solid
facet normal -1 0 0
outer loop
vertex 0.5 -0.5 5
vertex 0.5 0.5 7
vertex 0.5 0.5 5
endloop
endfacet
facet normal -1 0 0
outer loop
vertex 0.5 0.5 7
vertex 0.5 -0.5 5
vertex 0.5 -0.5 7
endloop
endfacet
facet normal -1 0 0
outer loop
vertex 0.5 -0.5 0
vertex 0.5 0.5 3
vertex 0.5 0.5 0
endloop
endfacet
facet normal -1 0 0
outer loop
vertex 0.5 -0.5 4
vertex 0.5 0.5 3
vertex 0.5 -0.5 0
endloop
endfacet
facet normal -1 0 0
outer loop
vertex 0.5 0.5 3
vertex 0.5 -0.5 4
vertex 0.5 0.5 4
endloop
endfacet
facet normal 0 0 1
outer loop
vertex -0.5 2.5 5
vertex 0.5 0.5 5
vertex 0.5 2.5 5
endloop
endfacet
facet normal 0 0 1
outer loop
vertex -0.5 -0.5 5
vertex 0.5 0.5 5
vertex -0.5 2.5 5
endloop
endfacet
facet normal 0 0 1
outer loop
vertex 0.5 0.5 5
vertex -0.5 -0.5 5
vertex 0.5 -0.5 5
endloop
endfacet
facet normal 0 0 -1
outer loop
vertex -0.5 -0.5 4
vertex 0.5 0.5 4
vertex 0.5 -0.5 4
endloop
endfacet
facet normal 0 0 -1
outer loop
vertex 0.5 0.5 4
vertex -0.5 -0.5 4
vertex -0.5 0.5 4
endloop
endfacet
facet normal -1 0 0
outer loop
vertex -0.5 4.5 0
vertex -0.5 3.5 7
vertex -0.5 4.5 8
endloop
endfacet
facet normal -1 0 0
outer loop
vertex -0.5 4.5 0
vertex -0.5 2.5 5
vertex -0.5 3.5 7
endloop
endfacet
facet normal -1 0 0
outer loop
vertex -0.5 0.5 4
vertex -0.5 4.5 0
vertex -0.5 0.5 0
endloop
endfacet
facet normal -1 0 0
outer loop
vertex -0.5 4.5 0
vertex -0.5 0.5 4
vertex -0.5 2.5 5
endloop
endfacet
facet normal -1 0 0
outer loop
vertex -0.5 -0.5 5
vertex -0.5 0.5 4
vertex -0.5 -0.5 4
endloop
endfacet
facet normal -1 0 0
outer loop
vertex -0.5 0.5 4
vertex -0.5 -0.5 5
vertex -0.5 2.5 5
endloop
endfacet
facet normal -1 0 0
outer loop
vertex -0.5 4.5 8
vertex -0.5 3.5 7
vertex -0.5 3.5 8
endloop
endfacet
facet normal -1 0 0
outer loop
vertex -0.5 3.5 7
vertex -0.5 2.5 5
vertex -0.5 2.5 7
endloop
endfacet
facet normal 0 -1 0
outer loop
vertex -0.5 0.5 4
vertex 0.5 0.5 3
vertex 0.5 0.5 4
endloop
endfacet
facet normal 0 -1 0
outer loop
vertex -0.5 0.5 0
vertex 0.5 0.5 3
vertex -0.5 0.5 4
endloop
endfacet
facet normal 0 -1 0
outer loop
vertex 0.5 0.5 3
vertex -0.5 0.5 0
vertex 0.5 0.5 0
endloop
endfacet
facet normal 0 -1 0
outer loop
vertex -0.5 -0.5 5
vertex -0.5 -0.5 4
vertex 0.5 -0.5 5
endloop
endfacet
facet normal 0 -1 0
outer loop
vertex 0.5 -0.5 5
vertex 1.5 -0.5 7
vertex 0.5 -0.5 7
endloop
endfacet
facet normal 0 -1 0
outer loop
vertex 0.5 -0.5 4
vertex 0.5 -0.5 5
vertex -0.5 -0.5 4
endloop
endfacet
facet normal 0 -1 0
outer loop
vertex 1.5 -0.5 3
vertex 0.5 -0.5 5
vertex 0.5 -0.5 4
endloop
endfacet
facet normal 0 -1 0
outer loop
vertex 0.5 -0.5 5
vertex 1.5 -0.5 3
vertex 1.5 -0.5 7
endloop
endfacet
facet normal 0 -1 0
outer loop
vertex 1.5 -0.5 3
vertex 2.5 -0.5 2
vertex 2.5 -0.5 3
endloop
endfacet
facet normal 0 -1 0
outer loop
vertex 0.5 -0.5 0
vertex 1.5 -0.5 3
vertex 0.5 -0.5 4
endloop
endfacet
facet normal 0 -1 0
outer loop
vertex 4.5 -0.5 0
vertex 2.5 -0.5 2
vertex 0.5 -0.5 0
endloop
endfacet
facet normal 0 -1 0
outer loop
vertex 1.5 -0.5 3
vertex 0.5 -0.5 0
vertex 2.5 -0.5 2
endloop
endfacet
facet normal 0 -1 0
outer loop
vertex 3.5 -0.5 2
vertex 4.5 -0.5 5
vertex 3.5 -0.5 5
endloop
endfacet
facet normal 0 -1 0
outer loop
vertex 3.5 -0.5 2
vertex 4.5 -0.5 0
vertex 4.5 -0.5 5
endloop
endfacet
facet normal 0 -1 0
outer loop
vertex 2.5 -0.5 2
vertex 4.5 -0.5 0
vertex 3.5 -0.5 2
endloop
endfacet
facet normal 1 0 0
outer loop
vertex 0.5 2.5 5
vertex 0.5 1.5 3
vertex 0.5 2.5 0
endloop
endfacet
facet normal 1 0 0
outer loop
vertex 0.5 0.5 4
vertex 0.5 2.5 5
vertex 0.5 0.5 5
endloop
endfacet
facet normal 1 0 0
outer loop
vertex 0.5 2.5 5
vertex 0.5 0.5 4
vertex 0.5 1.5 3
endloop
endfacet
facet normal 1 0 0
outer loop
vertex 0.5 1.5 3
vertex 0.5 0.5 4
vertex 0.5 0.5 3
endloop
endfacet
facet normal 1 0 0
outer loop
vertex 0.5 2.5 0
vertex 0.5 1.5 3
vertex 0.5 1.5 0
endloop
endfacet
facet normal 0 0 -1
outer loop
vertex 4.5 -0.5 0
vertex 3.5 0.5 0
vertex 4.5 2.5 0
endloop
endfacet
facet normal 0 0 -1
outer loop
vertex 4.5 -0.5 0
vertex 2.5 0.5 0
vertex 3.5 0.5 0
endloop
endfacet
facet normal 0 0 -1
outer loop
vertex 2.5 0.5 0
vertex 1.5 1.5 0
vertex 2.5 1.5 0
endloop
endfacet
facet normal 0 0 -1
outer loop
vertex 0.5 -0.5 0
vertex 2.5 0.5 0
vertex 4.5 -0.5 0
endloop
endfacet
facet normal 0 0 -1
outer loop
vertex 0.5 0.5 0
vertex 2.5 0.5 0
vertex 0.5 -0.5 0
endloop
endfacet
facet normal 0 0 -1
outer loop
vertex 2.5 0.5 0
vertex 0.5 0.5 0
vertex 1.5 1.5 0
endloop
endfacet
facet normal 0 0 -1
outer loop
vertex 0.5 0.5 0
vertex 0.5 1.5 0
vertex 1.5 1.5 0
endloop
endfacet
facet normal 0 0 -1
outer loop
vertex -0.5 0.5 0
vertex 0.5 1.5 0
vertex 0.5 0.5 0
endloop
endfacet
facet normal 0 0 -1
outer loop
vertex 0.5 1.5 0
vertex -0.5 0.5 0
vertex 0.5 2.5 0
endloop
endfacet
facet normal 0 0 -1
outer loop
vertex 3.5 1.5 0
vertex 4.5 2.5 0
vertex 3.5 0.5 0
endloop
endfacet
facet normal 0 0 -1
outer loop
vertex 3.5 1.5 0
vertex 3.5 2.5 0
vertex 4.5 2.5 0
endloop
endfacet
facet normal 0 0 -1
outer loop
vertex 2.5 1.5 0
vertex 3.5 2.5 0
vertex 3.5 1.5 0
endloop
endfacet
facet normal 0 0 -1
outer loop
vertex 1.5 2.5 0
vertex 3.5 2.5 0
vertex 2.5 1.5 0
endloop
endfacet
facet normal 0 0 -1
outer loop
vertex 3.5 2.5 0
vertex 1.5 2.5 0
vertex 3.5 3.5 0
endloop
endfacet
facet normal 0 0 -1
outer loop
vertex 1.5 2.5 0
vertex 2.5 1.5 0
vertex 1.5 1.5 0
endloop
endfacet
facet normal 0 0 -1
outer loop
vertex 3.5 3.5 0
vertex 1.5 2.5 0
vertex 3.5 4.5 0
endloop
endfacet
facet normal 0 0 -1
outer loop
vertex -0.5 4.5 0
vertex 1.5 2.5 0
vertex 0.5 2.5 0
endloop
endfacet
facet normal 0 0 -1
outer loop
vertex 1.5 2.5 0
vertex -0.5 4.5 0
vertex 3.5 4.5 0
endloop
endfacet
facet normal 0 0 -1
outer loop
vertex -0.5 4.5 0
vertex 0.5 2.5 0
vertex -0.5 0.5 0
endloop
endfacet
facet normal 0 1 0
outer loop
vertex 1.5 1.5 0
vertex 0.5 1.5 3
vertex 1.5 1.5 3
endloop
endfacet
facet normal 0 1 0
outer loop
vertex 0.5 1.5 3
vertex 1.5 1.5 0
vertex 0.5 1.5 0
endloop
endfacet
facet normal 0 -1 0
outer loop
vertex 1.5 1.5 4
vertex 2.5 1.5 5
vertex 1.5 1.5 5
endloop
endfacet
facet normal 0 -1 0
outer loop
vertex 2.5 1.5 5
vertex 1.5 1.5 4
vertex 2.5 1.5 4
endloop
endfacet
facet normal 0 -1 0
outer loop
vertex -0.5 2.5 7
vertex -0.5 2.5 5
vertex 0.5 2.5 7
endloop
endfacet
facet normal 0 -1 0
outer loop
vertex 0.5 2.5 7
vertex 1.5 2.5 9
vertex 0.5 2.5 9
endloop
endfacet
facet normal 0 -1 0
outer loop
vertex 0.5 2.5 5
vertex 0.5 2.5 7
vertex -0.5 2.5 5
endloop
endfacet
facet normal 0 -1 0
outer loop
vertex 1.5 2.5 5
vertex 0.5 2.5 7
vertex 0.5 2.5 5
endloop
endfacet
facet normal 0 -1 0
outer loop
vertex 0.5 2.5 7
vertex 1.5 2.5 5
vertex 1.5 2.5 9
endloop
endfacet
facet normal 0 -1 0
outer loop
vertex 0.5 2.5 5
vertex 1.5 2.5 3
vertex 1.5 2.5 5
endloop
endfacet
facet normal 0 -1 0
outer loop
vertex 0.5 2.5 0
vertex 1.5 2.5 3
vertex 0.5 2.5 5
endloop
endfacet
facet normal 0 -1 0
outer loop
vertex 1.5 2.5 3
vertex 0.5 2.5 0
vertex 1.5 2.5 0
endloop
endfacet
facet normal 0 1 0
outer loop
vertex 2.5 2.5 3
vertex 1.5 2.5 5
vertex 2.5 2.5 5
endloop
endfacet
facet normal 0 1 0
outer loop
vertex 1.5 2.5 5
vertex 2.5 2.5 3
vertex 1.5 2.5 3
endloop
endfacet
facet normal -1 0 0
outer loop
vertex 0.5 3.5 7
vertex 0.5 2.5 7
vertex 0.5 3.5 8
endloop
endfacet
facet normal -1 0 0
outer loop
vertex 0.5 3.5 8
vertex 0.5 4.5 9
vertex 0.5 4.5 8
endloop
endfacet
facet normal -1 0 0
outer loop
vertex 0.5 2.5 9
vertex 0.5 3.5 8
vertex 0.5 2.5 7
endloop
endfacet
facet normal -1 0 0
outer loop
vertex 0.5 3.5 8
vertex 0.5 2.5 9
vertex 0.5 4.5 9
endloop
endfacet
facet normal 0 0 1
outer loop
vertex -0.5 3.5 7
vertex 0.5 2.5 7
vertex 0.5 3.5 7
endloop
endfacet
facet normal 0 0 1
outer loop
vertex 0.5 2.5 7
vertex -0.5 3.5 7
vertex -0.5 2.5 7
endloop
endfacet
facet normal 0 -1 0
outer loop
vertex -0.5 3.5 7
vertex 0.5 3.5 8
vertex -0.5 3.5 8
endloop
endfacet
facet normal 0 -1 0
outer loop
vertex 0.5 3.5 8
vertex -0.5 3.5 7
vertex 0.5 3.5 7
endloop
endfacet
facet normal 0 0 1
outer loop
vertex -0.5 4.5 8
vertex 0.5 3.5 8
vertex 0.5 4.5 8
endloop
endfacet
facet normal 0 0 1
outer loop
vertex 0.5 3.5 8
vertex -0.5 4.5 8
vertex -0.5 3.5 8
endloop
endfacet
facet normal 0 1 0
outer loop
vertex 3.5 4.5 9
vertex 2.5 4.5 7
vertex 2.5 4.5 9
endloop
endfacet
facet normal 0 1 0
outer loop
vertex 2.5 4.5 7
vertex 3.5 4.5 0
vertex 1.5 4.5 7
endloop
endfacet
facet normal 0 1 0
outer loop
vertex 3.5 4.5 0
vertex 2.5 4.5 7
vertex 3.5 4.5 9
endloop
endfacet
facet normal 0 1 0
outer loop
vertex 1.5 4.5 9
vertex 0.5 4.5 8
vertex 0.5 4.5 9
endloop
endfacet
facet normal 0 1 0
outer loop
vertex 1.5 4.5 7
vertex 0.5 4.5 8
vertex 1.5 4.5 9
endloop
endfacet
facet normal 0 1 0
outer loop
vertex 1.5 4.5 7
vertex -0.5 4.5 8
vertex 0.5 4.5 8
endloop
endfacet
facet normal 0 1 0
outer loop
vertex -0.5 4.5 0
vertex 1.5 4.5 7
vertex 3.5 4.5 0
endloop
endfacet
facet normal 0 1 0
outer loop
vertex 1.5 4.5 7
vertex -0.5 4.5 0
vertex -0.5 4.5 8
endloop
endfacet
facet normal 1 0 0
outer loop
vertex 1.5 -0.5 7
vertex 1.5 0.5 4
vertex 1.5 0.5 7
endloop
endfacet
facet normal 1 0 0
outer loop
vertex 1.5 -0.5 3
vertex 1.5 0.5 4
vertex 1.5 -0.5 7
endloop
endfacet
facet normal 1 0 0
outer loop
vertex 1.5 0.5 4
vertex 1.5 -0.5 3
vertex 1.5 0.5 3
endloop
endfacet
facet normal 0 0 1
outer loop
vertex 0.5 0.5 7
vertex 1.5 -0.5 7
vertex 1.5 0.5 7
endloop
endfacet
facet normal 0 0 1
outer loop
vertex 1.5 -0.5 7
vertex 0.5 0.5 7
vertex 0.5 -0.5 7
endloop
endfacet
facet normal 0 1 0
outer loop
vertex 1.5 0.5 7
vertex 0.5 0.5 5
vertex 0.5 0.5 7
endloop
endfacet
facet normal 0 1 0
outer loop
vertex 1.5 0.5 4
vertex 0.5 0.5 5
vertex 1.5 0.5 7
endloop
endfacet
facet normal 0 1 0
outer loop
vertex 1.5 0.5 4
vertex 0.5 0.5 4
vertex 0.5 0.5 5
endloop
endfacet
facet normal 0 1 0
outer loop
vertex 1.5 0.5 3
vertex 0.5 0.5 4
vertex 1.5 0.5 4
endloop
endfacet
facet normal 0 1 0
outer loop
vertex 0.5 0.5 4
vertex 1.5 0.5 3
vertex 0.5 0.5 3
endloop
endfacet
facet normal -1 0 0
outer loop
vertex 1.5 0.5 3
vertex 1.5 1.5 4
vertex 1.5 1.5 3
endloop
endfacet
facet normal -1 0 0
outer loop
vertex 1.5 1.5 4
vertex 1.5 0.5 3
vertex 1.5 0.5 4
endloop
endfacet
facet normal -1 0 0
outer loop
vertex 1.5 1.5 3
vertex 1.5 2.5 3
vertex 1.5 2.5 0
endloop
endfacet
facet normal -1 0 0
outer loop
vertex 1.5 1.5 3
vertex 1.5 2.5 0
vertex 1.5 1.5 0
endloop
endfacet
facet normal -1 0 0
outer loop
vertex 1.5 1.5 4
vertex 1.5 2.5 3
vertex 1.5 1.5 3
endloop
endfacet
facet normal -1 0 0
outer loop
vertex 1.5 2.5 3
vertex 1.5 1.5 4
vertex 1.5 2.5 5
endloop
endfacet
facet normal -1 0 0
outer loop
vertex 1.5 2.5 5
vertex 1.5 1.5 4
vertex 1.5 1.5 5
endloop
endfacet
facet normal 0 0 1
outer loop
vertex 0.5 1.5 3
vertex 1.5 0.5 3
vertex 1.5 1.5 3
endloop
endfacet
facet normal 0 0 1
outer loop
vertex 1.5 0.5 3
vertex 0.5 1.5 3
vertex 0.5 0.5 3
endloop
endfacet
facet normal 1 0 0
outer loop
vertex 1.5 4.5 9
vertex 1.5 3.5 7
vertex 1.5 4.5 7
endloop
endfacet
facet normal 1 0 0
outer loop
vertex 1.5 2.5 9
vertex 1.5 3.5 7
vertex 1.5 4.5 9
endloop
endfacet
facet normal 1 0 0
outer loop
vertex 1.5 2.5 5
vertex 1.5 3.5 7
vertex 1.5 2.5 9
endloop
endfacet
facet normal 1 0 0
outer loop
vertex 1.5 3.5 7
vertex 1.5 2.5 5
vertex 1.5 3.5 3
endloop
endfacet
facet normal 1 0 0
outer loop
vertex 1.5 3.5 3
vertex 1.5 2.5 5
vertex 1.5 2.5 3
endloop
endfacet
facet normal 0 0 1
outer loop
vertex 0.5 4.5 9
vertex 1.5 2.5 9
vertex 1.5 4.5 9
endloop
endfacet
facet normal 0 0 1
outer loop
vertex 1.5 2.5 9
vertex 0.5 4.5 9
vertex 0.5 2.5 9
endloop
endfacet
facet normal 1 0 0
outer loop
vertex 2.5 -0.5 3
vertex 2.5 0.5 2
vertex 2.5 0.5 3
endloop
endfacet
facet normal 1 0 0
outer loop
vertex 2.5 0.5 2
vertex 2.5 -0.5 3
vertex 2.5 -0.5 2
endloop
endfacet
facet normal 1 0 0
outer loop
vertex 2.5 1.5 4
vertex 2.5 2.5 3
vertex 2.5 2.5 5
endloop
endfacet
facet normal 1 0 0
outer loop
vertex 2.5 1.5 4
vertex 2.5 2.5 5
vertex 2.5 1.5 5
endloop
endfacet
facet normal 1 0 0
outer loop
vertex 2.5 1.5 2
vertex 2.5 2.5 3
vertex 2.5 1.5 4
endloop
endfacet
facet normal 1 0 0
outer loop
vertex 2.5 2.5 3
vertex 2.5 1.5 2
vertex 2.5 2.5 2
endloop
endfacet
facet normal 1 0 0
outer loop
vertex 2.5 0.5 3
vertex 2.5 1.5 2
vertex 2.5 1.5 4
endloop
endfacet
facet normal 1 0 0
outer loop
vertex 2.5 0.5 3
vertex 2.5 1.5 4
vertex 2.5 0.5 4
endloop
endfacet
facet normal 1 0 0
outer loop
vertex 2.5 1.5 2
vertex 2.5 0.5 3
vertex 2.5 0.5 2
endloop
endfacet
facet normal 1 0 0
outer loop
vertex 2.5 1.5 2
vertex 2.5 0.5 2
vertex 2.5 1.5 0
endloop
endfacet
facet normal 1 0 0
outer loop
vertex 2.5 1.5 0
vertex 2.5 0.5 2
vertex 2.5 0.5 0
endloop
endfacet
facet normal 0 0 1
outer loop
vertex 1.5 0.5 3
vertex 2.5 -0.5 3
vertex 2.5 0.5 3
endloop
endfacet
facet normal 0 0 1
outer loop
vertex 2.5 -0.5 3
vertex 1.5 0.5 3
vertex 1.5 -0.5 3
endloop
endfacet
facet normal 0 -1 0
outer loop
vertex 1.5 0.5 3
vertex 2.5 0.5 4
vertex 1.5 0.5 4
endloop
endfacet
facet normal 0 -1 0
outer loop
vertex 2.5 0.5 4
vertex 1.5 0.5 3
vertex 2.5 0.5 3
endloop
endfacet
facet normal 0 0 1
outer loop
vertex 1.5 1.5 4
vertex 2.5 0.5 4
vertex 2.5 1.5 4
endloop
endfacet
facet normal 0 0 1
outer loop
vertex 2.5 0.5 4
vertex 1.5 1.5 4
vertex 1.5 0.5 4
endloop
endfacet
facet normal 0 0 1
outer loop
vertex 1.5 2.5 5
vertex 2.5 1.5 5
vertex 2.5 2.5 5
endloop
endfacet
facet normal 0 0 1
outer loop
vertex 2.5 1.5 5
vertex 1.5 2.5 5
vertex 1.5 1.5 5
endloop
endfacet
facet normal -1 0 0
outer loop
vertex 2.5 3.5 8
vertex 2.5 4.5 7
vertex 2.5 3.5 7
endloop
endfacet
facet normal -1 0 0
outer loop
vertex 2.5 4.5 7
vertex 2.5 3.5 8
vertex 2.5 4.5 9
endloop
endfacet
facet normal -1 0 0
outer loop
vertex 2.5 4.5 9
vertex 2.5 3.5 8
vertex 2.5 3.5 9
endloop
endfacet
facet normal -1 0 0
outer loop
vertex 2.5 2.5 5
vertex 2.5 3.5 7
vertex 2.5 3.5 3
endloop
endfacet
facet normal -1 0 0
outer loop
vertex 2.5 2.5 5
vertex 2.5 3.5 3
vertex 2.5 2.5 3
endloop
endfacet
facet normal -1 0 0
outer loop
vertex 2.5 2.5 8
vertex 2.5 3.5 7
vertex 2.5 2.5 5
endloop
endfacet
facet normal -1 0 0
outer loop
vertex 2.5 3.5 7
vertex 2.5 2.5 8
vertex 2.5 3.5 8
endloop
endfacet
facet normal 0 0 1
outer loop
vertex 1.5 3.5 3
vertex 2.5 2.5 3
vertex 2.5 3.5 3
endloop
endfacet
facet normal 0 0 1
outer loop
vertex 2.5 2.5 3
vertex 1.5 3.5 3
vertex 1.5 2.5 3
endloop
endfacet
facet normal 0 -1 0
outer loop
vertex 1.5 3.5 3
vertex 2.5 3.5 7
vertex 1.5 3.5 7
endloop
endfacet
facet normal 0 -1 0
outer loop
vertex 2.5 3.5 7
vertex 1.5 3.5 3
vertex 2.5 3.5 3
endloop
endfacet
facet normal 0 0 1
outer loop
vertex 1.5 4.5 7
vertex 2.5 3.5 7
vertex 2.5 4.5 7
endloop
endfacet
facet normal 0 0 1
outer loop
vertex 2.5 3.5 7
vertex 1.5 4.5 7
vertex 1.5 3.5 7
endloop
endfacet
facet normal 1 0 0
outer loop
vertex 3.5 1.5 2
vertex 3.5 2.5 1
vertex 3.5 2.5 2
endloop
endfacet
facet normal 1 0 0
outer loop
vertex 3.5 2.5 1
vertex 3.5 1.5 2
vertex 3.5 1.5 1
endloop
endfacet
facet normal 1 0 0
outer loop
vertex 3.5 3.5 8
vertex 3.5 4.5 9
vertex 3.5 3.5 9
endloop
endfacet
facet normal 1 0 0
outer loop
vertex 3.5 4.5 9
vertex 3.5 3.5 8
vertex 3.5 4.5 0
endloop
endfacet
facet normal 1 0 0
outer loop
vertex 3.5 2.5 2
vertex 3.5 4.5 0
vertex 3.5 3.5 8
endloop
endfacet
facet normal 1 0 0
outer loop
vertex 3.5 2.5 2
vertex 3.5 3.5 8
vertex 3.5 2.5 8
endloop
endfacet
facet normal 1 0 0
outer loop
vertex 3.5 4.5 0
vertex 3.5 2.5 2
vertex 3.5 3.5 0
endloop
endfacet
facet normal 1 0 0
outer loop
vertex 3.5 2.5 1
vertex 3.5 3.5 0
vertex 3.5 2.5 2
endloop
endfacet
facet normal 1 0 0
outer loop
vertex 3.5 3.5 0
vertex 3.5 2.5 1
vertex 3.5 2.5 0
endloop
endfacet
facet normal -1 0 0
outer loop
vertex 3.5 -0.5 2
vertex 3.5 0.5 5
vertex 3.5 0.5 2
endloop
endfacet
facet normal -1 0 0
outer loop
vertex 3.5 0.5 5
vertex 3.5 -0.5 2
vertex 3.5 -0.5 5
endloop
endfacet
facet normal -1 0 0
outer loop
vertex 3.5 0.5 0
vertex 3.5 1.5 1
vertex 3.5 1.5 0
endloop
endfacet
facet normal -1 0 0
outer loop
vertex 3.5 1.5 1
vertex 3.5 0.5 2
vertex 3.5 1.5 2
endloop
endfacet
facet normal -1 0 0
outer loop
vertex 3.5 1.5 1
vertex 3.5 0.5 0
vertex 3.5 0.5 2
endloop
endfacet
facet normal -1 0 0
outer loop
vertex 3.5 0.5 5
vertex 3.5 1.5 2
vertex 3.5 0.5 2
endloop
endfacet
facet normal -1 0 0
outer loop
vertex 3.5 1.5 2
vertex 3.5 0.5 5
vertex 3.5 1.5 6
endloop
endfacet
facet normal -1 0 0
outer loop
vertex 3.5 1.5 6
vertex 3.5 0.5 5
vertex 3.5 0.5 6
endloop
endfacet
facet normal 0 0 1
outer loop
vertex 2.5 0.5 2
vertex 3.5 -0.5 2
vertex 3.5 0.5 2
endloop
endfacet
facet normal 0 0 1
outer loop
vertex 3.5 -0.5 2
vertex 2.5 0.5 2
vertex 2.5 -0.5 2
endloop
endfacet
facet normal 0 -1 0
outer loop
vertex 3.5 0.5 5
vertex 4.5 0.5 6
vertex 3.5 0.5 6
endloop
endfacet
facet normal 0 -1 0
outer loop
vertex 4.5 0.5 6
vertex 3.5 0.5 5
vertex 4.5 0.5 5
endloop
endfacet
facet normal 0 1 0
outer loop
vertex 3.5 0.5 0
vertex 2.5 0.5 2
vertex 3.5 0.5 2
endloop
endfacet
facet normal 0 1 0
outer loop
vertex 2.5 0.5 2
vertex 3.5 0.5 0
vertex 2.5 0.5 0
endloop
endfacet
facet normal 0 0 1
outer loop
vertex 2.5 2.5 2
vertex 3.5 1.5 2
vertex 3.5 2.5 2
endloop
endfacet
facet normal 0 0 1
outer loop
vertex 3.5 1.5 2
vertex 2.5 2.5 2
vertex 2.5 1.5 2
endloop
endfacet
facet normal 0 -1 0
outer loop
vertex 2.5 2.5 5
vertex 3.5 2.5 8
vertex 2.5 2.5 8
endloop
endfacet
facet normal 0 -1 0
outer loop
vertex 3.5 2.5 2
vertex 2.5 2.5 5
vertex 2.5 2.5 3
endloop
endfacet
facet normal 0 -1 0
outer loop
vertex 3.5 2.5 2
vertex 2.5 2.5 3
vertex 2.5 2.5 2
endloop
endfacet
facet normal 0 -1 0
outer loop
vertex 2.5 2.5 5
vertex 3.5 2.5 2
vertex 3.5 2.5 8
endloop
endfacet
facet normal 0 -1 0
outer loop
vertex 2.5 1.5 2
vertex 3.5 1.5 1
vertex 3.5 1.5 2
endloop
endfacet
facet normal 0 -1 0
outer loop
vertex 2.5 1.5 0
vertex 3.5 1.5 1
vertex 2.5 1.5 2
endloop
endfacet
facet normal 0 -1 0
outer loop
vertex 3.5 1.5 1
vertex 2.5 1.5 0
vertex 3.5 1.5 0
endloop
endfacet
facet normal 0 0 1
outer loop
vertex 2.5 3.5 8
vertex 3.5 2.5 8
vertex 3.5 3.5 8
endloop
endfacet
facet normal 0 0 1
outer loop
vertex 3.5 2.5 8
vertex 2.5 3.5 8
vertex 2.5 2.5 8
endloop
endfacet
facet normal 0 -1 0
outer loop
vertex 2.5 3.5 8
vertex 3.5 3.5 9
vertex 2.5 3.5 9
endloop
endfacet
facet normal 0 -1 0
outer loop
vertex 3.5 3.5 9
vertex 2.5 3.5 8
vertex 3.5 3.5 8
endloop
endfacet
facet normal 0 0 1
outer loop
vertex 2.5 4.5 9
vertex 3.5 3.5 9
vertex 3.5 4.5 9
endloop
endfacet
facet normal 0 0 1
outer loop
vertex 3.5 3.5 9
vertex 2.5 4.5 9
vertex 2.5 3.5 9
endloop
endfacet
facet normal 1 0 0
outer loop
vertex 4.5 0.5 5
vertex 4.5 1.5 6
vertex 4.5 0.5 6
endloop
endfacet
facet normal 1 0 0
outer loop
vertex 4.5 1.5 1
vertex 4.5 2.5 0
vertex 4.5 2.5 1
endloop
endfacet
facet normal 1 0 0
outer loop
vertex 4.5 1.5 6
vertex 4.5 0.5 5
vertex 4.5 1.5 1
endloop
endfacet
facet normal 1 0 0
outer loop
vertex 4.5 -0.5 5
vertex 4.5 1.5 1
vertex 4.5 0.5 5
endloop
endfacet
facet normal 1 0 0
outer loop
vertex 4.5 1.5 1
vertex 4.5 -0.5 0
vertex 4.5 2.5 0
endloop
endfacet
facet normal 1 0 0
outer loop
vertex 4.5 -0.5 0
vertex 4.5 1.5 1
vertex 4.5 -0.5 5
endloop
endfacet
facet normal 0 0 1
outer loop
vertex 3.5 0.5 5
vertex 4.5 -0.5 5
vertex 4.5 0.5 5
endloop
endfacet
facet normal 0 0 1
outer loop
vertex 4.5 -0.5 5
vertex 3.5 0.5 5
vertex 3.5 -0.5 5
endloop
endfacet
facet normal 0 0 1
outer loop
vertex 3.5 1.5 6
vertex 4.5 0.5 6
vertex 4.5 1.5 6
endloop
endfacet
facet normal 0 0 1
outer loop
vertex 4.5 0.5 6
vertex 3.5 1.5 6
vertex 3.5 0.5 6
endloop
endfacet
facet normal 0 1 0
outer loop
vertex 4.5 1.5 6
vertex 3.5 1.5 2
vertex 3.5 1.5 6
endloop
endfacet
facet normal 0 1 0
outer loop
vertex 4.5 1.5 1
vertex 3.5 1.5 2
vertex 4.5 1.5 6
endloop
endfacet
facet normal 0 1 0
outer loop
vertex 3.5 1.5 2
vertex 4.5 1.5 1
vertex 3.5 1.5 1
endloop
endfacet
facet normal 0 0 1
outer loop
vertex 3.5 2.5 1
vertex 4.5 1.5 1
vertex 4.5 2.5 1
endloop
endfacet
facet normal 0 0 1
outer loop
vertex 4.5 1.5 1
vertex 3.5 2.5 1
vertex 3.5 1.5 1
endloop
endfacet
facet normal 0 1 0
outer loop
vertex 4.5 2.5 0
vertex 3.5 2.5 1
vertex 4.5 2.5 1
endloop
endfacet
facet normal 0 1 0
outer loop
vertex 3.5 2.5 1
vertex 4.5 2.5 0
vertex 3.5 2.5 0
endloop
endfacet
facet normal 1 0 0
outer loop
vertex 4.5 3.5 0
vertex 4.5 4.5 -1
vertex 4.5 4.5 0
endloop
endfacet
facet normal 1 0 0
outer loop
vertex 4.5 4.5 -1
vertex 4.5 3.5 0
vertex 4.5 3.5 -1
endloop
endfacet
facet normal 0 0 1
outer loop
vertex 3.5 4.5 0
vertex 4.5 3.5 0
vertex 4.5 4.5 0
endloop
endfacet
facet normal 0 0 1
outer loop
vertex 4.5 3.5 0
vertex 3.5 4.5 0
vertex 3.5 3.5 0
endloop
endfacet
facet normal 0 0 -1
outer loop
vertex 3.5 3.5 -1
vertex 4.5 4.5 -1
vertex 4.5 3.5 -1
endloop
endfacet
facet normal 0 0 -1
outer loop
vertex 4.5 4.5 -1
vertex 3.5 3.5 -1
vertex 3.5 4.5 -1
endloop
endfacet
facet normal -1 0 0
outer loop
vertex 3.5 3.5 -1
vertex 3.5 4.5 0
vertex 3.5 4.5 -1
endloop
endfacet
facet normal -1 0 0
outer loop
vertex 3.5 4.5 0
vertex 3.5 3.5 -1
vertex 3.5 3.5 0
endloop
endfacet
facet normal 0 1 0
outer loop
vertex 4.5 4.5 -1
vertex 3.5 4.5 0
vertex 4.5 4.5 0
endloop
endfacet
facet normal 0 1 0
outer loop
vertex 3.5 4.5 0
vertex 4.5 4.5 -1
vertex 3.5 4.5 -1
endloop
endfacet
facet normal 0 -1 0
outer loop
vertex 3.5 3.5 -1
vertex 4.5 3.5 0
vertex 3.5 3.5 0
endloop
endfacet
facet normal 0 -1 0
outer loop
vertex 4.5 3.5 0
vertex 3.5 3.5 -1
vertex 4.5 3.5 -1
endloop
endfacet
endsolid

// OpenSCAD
union() {
    translate([0, 0, 4.5]) color([1, 0, 0]) cube([1, 1, 1], center=true);
    translate([0, 1, 2.5]) cube([1, 1, 5], center=true);
    translate([0, 2, 2.5]) cube([1, 1, 5], center=true);
    translate([0, 3, 3.5]) cube([1, 1, 7], center=true);
    translate([0, 4, 4.0]) cube([1, 1, 8], center=true);
    translate([1, 0, 3.5]) cube([1, 1, 7], center=true);
    translate([1, 1, 1.5]) cube([1, 1, 3], center=true);
    translate([1, 3, 4.5]) cube([1, 1, 9], center=true);
    translate([1, 4, 4.5]) cube([1, 1, 9], center=true);
    translate([2, 0, 1.5]) cube([1, 1, 3], center=true);
    translate([2, 1, 2.0]) cube([1, 1, 4], center=true);
    translate([2, 2, 2.5]) cube([1, 1, 5], center=true);
    translate([2, 3, 1.5]) cube([1, 1, 3], center=true);
    translate([2, 4, 3.5]) cube([1, 1, 7], center=true);
    translate([3, 0, 1.0]) cube([1, 1, 2], center=true);
    translate([3, 2, 1.0]) cube([1, 1, 2], center=true);
    translate([3, 3, 4.0]) cube([1, 1, 8], center=true);
    translate([3, 4, 4.5]) cube([1, 1, 9], center=true);
    translate([4, 0, 2.5]) cube([1, 1, 5], center=true);
    translate([4, 1, 3.0]) cube([1, 1, 6], center=true);
    translate([4, 2, 0.5]) cube([1, 1, 1], center=true);
    translate([4, 4, -0.5]) color([0, 0, 1]) cube([1, 1, 1], center=true);
}
